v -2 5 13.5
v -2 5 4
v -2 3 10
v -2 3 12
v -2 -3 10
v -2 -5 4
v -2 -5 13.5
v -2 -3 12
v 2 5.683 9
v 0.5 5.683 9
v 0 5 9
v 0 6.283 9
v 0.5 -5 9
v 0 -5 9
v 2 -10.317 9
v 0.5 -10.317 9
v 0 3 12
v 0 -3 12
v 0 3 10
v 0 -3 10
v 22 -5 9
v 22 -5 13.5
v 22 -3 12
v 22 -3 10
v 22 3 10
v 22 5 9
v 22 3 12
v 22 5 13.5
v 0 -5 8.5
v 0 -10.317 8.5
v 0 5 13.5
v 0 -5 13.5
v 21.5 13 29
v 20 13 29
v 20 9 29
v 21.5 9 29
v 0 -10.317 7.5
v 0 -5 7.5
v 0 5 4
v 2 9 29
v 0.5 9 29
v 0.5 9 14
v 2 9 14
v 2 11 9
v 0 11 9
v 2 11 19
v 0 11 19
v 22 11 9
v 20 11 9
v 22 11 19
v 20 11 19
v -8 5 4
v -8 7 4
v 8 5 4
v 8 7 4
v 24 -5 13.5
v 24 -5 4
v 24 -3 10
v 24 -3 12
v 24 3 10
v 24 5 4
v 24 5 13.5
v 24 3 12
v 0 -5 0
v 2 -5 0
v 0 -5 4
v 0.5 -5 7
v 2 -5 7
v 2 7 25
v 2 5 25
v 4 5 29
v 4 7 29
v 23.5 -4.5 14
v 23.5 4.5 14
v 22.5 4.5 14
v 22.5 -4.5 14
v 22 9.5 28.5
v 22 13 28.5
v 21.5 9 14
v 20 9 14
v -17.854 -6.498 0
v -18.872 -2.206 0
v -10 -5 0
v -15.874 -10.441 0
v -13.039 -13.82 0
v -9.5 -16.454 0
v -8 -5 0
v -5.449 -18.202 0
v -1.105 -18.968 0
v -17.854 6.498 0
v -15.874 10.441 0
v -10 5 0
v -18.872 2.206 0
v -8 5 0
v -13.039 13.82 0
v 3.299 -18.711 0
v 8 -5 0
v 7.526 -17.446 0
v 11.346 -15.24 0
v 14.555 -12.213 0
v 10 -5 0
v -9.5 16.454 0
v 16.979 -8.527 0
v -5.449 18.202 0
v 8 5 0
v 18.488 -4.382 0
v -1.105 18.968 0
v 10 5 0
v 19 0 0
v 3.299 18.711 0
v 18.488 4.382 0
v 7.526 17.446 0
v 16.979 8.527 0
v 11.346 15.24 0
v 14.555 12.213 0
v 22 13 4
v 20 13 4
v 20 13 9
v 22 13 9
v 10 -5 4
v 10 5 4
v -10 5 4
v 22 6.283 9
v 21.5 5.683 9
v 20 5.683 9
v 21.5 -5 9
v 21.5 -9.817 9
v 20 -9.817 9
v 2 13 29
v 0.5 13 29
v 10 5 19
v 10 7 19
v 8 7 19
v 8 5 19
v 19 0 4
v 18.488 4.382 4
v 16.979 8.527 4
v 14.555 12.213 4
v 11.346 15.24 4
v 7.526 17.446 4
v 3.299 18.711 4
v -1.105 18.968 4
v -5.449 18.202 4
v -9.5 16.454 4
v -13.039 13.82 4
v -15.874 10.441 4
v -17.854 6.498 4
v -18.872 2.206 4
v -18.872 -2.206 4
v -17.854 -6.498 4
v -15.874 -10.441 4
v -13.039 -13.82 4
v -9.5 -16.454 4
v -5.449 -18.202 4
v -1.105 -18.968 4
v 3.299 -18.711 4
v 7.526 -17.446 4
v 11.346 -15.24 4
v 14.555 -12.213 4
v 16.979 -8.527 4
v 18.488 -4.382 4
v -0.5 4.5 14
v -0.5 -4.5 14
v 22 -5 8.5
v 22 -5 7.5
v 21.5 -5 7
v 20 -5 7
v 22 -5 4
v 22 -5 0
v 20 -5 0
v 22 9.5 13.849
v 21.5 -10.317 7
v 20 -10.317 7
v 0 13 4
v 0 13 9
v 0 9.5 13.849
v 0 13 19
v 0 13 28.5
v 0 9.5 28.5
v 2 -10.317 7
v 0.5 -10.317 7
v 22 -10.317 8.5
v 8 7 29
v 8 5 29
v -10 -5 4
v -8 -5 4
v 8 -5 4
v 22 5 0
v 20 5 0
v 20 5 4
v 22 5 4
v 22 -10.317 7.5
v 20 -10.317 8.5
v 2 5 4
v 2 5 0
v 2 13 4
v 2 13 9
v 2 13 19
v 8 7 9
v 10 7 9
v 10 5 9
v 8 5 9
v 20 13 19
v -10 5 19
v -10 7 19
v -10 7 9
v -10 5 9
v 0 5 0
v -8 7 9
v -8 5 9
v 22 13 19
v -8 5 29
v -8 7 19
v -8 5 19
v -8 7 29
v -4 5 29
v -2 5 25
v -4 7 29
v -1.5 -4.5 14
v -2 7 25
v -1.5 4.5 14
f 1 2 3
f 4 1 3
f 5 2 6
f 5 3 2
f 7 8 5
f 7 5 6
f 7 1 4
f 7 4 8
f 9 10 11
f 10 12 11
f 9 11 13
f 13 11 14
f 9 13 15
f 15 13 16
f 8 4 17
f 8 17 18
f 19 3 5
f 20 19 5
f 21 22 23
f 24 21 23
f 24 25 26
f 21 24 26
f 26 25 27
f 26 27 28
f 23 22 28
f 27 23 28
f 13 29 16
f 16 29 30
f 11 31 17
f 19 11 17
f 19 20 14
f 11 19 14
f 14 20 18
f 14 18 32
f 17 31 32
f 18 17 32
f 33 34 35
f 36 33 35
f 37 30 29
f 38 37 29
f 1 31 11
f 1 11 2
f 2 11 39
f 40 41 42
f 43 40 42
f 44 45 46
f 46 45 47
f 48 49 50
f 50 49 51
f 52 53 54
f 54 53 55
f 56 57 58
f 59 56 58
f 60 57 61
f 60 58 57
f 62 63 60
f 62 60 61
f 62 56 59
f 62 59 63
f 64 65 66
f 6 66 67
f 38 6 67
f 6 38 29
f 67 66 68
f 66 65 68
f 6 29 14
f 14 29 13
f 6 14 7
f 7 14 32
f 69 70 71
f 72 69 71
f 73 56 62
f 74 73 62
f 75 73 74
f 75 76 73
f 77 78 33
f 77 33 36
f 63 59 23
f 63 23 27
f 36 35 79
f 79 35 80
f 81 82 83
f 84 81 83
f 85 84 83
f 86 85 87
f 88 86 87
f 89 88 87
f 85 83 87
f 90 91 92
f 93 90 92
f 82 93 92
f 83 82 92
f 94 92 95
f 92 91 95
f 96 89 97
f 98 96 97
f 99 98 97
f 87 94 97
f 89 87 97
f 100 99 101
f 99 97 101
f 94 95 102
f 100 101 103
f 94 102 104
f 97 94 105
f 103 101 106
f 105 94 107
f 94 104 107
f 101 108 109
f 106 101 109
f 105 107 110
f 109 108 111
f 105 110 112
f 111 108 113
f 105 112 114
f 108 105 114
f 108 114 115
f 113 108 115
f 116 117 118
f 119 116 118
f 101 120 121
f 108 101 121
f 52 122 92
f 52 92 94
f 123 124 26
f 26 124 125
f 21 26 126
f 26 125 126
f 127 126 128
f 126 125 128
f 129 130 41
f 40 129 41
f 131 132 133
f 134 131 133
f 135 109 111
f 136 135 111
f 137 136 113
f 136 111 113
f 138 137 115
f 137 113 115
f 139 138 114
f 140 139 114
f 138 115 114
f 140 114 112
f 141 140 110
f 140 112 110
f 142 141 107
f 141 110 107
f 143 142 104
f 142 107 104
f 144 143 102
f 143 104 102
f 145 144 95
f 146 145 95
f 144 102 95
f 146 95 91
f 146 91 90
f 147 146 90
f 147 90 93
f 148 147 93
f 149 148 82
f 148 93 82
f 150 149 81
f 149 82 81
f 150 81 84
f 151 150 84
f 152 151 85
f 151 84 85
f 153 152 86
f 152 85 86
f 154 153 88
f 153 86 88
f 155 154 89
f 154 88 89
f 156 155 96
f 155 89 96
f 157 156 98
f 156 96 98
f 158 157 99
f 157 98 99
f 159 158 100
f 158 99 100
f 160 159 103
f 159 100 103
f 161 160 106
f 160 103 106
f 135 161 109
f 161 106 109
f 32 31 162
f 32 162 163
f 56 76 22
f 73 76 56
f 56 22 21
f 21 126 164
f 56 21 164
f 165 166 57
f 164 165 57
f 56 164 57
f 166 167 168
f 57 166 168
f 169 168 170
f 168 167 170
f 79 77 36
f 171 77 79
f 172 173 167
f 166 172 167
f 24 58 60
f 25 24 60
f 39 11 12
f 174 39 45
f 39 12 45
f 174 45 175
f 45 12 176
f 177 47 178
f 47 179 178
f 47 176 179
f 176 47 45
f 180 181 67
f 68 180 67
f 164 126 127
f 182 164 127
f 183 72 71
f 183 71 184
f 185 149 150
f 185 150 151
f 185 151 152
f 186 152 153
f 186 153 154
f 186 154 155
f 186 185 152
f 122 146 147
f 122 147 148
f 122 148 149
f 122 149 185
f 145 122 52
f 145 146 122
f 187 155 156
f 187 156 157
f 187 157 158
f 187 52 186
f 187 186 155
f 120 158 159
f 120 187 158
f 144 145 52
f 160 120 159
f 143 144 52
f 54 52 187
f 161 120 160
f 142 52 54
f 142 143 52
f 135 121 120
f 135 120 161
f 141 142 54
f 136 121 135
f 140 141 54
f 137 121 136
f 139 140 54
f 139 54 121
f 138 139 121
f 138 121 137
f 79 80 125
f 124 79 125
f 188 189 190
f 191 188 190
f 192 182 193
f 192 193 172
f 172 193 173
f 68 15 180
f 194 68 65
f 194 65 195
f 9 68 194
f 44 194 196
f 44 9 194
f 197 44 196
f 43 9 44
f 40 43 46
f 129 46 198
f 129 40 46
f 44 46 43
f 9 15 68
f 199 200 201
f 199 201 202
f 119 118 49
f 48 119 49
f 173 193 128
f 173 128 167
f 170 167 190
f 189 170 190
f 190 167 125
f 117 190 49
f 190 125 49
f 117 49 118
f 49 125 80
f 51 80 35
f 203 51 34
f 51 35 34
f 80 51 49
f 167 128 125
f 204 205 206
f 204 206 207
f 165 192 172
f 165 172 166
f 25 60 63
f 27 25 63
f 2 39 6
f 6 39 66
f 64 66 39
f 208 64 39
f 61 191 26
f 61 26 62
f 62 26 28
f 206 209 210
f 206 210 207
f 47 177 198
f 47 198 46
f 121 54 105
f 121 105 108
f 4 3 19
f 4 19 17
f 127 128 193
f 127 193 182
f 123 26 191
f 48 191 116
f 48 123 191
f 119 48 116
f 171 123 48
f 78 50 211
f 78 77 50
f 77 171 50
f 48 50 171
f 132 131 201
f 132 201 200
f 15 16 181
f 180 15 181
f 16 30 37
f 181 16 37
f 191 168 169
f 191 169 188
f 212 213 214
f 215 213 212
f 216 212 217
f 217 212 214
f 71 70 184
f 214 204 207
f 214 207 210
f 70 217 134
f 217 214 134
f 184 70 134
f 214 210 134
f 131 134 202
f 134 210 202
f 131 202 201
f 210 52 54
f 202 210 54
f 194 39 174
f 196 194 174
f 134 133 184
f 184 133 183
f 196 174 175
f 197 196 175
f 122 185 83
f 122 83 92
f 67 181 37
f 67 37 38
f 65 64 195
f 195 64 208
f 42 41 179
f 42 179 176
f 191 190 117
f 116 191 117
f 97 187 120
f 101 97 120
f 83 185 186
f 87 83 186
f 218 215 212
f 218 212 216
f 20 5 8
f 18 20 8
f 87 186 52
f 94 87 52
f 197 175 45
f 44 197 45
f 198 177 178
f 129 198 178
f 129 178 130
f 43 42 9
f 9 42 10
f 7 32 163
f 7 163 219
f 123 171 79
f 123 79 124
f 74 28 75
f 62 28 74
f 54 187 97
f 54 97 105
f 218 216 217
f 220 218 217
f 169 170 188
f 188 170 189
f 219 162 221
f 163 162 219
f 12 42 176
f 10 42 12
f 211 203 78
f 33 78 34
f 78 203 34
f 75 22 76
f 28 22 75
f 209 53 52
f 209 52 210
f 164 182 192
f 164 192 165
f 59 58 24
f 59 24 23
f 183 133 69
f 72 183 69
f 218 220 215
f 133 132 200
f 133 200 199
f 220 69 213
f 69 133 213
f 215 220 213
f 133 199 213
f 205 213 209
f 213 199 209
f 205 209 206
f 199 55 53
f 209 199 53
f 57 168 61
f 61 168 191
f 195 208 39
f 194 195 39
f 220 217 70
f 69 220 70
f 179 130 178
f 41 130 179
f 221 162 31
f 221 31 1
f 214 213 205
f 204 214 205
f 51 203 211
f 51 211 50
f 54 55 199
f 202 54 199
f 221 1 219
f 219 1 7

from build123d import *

# Parameters (mm, degrees)
F0_R       = 19
F1_DEPTH   = 4
F2_W       = 2
F2_H       = 10
F3_DEPTH   = 4.001
F5_DEPTH   = 2
F8_DEPTH   = 25
F9_W       = 2
F9_H       = 10
F9_H_2     = 5
F10_DEPTH  = 26.001
F6_W       = 2
F6_H       = 10
F11_DEPTH  = 19.001
F13_DEPTH  = 14.001
F15_W      = 10
F15_H      = 5
F16_DEPTH  = 2
F17_W      = 6
F17_H      = 2
F18_DEPTH  = 24.001
F19_W      = 10
F19_H      = 5
F20_DEPTH  = 2
F21_W      = 6
F21_H      = 2
F22_DEPTH  = 43.001
F23_SIZE   = 0.5
F23_2_SIZE = 0.5


with BuildPart() as f1:
    # F0 (on Top) → F1 (new body)
    with BuildSketch(Plane.XY):
        Circle(F0_R)
    extrude(amount=F1_DEPTH)

    # F2 (on face) → F3 (cut, through all)
    with BuildSketch(Plane.XY.offset(4)):
        with Locations((-9, 0)):
            Rectangle(F2_W, F2_H)
        with Locations((9, 0)):
            Rectangle(F2_W, F2_H)
    extrude(amount=-F3_DEPTH, mode=Mode.SUBTRACT)


with BuildPart() as f5:
    # F4 (on Right) → F5 (new body)
    with BuildSketch(Plane.YZ):
        Polygon((-5, 4), (-5, 0), (5, 0), (5, 4), (13, 4), (13, 29), (9, 29), (9, 14), (5.6833752096, 9), (-10.3166247904, 9), (-10.3166247904, 7), (-5, 7), align=None)
    extrude(amount=F5_DEPTH)

    # F6 (on face) → F11 (cut, through all)
    with BuildSketch(Plane(origin=(0, 0, 0), x_dir=(0, -1, 0), z_dir=(-1, 0, 0))):
        with Locations((-12, 14)):
            Rectangle(F6_W, F6_H)
    extrude(amount=-F11_DEPTH, mode=Mode.SUBTRACT)


with BuildPart() as f8:
    # F7 (on face) → F8 (new body)
    with BuildSketch(Plane.XY.offset(4)):
        Polygon((-10, 7), (-10, 5), (-8, 5), (8, 5), (10, 5), (10, 7), align=None)
    extrude(amount=F8_DEPTH)

    # F9 (on face) → F10 (cut, through all)
    with BuildSketch(Plane(origin=(0, 7, 0), x_dir=(-1, 0, 0), z_dir=(0, 1, 0))):
        with Locations((-9, 24)):
            Rectangle(F9_W, F9_H)
        with Locations((9, 24)):
            Rectangle(F9_W, F9_H)
        with Locations((9, 6.5)):
            Rectangle(F9_W, F9_H_2)
        with Locations((-9, 6.5)):
            Rectangle(F9_W, F9_H_2)
    extrude(amount=-F10_DEPTH, mode=Mode.SUBTRACT)

    # F12 (on face) → F13 (cut, through all)
    with BuildSketch(Plane.XZ.offset(-5)):
        Polygon((4, 29), (-4, 29), (-2, 25), (2, 25), align=None)
    extrude(amount=-F13_DEPTH, mode=Mode.SUBTRACT)


with BuildPart() as f14_1:
    # F14: copy of F5
    add(f5.part.moved(Location((20, 0, 0))))

    # F19 (on face) → F20 (join)
    with BuildSketch(Plane.YZ.offset(22)):
        with Locations((0, 11.5)):
            Rectangle(F19_W, F19_H)
        Polygon((-5, 4), (5, 4), (5, 9), (-5, 9), (-5, 7), align=None)
    extrude(amount=F20_DEPTH)

    # F21 (on face) → F22 (cut, through all)
    with BuildSketch(Plane.YZ.offset(24)):
        with Locations((0, 11)):
            Rectangle(F21_W, F21_H)
    extrude(amount=-F22_DEPTH, mode=Mode.SUBTRACT)

    # F23#2
    f23_2_edges = [f14_1.edges().sort_by_distance(p)[0] for p in [
        (24, 0, 14),
        (23, -5, 14),
        (23, 5, 14),
        (22, 0, 14),
        (22, -7.658312, 9),
        (21, -10.316625, 9),
        (22, 7.341688, 11.5),
        (22, 9, 21.5),
        (22, 11, 29),
        (22, -7.658312, 7),
    ]]
    chamfer(f23_2_edges, length=F23_2_SIZE)


with BuildPart() as f5_1:
    add(f5.part)

    # F15 (on face) → F16 (join)
    with BuildSketch(Plane(origin=(0, 0, 0), x_dir=(0, -1, 0), z_dir=(-1, 0, 0))):
        with Locations((0, 11.5)):
            Rectangle(F15_W, F15_H)
        Polygon((-5, 9), (-5, 4), (5, 4), (5, 7), (5, 9), align=None)
    extrude(amount=F16_DEPTH)

    # F17 (on face) → F18 (cut, through all)
    with BuildSketch(Plane(origin=(-2, 0, 0), x_dir=(0, -1, 0), z_dir=(-1, 0, 0))):
        with Locations((0, 11)):
            Rectangle(F17_W, F17_H)
    extrude(amount=-F18_DEPTH, mode=Mode.SUBTRACT)

    # F23
    f23_edges = [f5_1.edges().sort_by_distance(p)[0] for p in [
        (0, -7.658312, 9),
        (0, 0, 14),
        (-1, -5, 14),
        (-2, 0, 14),
        (-1, 5, 14),
        (0, 7.341688, 11.5),
        (0, 9, 21.5),
        (0, 11, 29),
        (0, -7.658312, 7),
    ]]
    chamfer(f23_edges, length=F23_SIZE)


solid = Compound([f1.part, f8.part, f14_1.part, f5_1.part])
